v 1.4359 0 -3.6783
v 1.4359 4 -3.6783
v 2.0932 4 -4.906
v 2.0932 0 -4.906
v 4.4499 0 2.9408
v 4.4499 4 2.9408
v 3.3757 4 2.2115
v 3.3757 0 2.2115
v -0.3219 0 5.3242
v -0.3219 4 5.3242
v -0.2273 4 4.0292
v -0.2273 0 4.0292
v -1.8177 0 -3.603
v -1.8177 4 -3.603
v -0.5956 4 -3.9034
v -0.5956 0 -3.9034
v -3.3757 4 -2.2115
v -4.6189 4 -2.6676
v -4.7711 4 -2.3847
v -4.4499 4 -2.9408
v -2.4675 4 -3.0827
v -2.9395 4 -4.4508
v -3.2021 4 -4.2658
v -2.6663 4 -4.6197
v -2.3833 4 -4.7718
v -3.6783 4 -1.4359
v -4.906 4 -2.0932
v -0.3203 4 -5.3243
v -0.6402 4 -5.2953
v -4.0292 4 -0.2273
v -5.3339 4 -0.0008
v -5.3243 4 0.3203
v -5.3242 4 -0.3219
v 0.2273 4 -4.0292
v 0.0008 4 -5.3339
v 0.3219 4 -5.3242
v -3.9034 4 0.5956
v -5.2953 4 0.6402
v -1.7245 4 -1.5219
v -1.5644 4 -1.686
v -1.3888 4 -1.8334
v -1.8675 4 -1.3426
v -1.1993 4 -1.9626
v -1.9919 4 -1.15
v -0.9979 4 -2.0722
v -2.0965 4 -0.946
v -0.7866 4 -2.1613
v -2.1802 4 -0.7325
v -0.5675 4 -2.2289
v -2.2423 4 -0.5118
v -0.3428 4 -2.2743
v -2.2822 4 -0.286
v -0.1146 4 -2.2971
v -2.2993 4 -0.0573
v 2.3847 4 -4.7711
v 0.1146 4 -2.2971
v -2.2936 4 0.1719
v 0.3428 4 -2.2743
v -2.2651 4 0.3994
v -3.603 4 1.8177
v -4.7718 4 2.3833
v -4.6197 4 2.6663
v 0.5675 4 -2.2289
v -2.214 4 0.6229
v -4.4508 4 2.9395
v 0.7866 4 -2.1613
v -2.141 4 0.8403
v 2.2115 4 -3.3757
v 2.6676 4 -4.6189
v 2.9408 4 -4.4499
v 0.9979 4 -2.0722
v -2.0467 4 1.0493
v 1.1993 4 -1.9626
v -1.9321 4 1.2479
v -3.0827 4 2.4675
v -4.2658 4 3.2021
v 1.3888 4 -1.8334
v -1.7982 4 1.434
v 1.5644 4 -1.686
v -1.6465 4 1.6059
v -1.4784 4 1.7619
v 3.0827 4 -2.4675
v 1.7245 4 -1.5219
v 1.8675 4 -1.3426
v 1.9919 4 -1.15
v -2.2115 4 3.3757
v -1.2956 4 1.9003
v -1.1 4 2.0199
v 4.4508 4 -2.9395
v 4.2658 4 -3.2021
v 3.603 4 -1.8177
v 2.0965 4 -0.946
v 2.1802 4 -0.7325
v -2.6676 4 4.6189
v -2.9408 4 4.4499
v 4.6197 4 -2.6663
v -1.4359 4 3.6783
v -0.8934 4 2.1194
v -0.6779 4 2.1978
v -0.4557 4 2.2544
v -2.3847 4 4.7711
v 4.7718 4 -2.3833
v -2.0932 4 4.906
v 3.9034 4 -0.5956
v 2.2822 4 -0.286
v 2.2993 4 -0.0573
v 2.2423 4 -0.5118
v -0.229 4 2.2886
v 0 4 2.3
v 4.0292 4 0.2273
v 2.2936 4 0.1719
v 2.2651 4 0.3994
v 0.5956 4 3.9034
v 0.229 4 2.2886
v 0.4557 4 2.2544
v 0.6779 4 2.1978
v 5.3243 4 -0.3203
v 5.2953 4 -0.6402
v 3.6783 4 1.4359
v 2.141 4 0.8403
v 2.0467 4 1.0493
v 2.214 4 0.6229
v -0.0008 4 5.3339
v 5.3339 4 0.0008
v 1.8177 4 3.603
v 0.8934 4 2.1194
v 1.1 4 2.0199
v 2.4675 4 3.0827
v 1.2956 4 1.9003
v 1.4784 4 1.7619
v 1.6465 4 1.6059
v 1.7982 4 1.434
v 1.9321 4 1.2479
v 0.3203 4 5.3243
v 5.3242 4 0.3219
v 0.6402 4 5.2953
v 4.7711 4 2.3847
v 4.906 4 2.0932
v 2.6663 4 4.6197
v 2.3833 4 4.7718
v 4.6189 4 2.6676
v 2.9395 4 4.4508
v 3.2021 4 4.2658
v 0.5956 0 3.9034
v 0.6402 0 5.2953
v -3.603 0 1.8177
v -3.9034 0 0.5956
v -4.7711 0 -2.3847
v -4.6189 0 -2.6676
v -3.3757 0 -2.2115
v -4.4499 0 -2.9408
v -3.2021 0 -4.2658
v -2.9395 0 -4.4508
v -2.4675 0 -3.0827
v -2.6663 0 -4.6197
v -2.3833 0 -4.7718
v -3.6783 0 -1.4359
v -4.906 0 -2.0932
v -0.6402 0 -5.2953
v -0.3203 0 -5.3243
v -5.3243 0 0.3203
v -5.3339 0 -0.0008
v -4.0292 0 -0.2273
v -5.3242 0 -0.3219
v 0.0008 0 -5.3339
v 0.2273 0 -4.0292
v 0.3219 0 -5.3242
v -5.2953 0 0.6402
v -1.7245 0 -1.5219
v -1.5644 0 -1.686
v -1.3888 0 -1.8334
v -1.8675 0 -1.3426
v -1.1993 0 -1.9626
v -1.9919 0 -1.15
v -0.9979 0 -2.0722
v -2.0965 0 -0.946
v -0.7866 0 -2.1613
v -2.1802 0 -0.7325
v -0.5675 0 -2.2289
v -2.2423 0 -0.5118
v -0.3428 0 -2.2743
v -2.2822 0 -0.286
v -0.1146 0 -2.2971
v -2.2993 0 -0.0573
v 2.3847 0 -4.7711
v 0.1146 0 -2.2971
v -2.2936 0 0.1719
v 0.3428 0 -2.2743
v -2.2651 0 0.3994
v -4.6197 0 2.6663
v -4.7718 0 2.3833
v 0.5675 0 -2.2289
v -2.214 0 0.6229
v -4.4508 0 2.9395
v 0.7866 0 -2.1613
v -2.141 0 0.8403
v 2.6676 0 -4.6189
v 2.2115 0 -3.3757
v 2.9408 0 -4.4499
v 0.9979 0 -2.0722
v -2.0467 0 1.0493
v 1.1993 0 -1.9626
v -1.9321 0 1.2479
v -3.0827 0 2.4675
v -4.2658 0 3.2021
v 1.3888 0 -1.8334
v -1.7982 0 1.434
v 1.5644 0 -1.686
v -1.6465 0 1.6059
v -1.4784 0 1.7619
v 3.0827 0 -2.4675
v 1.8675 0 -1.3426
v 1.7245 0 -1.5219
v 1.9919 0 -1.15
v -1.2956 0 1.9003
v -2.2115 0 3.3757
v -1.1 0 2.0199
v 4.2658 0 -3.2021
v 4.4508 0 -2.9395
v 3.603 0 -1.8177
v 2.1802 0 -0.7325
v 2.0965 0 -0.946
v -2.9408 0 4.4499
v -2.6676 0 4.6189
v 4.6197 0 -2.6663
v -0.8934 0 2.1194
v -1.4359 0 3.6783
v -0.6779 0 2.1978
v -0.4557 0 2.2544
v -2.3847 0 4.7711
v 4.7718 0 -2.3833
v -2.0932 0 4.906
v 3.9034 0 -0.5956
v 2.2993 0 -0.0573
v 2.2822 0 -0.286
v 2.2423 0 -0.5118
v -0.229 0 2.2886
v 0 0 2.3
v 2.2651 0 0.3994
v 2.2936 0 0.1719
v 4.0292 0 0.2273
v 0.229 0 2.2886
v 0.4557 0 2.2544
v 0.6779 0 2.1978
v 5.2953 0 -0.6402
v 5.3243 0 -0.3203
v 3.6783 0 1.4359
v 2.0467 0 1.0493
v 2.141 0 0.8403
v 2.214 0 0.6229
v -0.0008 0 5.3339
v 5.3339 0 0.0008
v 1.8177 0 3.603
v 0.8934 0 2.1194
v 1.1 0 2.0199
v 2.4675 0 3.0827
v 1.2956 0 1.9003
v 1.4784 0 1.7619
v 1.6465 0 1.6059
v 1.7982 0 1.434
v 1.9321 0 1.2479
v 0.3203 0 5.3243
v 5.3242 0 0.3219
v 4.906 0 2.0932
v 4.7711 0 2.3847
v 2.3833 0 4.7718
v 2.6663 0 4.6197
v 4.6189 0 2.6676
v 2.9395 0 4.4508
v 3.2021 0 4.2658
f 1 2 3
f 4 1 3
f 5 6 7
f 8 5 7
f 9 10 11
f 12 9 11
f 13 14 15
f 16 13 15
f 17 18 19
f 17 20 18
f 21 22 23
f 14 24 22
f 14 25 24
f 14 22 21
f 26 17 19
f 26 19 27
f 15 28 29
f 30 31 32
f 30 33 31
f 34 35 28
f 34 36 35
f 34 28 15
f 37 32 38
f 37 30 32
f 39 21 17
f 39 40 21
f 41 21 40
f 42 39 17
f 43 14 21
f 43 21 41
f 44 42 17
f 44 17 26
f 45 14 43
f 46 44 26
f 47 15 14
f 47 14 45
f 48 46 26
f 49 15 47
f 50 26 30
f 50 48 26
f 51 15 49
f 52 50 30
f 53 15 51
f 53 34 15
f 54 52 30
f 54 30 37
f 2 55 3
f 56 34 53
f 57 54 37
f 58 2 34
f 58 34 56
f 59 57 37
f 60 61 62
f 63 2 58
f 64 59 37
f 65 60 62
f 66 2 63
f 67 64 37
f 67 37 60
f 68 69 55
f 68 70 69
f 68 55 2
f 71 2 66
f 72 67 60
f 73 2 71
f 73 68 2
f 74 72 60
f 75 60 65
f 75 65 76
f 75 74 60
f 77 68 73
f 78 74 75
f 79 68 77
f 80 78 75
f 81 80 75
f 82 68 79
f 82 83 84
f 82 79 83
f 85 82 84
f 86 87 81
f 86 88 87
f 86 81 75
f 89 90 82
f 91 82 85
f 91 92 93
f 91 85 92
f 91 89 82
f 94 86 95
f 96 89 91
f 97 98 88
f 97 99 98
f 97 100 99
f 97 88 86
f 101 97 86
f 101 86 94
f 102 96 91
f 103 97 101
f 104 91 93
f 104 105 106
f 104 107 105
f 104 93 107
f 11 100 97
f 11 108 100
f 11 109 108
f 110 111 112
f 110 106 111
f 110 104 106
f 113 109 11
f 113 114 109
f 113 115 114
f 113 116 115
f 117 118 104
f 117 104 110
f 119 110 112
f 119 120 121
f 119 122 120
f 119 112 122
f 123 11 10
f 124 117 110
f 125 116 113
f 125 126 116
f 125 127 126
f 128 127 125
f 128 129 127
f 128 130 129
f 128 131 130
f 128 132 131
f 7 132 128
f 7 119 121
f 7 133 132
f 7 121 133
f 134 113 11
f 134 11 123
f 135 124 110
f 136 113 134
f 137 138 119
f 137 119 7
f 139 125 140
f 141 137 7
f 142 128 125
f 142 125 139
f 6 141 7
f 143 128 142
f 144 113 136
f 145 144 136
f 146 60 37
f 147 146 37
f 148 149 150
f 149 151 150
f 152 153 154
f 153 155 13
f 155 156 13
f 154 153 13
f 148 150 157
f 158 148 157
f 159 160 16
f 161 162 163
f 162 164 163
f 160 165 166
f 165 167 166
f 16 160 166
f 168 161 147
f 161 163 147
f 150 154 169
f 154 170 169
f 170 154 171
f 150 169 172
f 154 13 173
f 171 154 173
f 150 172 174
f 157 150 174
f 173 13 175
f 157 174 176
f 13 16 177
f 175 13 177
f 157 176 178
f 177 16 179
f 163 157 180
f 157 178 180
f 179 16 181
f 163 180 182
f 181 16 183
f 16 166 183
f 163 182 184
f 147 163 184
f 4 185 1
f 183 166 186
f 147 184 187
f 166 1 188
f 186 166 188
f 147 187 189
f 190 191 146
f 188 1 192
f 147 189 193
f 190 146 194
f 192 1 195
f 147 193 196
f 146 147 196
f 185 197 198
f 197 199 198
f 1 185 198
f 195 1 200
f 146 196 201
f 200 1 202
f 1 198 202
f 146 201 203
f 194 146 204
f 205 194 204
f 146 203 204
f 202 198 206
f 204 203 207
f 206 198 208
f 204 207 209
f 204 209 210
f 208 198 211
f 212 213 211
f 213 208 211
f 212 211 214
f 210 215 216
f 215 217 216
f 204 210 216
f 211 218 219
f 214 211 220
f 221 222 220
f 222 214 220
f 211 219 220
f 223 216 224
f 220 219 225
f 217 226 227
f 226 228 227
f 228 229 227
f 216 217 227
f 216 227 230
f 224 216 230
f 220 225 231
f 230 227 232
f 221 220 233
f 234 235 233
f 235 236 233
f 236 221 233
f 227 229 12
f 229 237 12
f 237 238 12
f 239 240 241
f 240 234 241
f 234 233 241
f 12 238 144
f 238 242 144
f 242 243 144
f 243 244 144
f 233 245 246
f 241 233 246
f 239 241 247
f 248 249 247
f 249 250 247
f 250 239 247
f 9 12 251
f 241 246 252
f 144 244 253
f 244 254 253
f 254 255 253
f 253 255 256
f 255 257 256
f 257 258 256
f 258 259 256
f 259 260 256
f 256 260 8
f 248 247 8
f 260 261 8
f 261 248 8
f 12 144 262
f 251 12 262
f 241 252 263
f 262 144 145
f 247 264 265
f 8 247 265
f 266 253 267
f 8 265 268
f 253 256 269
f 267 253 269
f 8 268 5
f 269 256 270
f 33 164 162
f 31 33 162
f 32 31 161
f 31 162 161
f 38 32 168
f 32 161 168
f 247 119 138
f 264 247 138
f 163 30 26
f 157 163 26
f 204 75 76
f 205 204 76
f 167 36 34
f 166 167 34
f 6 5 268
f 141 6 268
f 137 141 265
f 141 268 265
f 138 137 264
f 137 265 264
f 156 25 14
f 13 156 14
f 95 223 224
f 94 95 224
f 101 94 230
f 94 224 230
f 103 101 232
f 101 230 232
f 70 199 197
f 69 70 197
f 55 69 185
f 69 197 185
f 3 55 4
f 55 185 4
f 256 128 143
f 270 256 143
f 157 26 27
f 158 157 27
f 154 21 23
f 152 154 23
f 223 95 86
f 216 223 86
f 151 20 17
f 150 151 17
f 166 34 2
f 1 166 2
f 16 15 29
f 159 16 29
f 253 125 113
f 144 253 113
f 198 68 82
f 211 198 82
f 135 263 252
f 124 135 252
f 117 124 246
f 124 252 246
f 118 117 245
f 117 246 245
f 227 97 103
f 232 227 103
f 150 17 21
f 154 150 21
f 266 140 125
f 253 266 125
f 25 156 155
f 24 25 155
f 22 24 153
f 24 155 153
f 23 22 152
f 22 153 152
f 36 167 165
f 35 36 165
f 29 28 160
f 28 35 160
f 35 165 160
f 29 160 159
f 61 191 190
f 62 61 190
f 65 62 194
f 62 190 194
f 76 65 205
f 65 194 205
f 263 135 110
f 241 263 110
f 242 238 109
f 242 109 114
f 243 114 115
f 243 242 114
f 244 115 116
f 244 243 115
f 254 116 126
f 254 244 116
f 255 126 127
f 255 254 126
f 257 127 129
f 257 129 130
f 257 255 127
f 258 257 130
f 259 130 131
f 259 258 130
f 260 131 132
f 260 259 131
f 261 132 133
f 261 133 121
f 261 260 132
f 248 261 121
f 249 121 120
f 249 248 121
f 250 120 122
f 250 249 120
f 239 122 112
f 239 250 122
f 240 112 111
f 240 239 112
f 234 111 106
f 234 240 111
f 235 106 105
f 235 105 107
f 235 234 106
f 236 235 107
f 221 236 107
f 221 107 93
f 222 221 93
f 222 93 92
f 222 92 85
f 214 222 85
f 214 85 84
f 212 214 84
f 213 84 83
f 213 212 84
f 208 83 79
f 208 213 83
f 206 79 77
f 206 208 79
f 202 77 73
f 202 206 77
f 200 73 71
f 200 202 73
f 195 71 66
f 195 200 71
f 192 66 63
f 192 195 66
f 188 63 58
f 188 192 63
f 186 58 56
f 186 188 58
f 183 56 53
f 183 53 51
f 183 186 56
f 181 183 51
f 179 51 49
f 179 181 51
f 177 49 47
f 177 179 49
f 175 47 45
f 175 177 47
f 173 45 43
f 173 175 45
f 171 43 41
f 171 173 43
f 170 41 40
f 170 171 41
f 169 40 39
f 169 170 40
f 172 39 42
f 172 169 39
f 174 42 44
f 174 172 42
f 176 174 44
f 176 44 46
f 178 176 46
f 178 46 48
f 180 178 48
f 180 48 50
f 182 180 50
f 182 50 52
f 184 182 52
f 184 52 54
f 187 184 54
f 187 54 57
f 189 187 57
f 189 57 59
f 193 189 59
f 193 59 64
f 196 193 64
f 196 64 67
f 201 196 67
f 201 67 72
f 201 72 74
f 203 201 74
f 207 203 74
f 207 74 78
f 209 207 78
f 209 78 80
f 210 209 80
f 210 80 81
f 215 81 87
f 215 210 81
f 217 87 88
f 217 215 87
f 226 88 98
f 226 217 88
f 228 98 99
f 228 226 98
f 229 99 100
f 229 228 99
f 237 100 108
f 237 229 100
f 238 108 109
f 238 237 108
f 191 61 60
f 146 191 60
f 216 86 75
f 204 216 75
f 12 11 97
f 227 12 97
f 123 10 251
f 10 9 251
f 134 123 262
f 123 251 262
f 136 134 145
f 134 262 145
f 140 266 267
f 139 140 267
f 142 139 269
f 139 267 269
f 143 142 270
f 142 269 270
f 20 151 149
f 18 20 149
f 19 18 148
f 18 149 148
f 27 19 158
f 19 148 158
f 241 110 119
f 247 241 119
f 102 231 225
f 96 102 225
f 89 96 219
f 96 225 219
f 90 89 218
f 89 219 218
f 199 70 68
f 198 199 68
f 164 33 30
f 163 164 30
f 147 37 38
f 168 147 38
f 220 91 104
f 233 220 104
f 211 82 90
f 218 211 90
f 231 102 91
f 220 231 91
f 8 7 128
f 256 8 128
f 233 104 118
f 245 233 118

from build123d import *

# Parameters (mm, degrees)
ESQUISSE1_R                  = 6
ESQUISSE1_R_2                = 2.3
BOSS_EXTRU_1_DEPTH           = 4
ENL_V_MAT_EXTRU_1_DEPTH      = 4
ENL_V_MAT_EXTRU_2_DEPTH      = 10
ENL_V_MAT_EXTRU_2_DEPTH_BACK = 10
ESQUISSE3_R                  = 6.951264174
ESQUISSE3_R_2                = 5.333890826


with BuildPart() as part:
    # Esquisse1 → Boss.-Extru.1 (new body)
    with BuildSketch(Plane(origin=(0, 0, 0), x_dir=(1, 0, 0), z_dir=(0, 1, 0))):
        Circle(ESQUISSE1_R)
        Circle(ESQUISSE1_R_2, mode=Mode.SUBTRACT)
    extrude(amount=BOSS_EXTRU_1_DEPTH)

    # Esquisse2 → Enlèv. mat.-Extru.1 (cut)
    with BuildSketch(Plane(origin=(0, 4, 0), x_dir=(1, 0, 0), z_dir=(0, 1, 0))):
        Polygon((0.37038816, 5.988556805), (0.227331291, 4.029155081), (1.435903549, 3.678279264), (2.408685878, 5.495291834), (1.792659416, 6.071810959), align=None)
        Polygon((3.315043958, 5.001048246), (2.211452214, 3.375685011), (3.082668583, 2.467531511), (4.833629077, 3.55471939), (4.588394074, 4.36201283), align=None)
        Polygon((5.371436405, 2.673512847), (3.603016302, 1.817702868), (3.90343506, 0.595610681), (5.963405269, 0.661662757), (6.154672246, 1.483416885), align=None)
        Polygon((5.988556805, -0.37038816), (4.029155081, -0.227331291), (3.678279264, -1.435903549), (5.495291834, -2.408685878), (6.071810959, -1.792659416), align=None)
        Polygon((5.001048246, -3.315043958), (3.375685011, -2.211452214), (2.467531511, -3.082668583), (3.55471939, -4.833629077), (4.36201283, -4.588394074), align=None)
        Polygon((2.673512847, -5.371436405), (1.817702868, -3.603016302), (0.595610681, -3.90343506), (0.661662757, -5.963405269), (1.483416885, -6.154672246), align=None)
        Polygon((-0.37038816, -5.988556805), (-0.227331291, -4.029155081), (-1.435903549, -3.678279264), (-2.408685878, -5.495291834), (-1.792659416, -6.071810959), align=None)
        Polygon((-3.315043958, -5.001048246), (-2.211452214, -3.375685011), (-3.082668583, -2.467531511), (-4.833629077, -3.55471939), (-4.588394074, -4.36201283), align=None)
        Polygon((-5.371436405, -2.673512847), (-3.603016302, -1.817702868), (-3.90343506, -0.595610681), (-5.963405269, -0.661662757), (-6.154672246, -1.483416885), align=None)
        Polygon((-5.988556805, 0.37038816), (-4.029155081, 0.227331291), (-3.678279264, 1.435903549), (-5.495291834, 2.408685878), (-6.071810959, 1.792659416), align=None)
        Polygon((-5.001048246, 3.315043958), (-3.375685011, 2.211452214), (-2.467531511, 3.082668583), (-3.55471939, 4.833629077), (-4.36201283, 4.588394074), align=None)
        Polygon((-2.673512847, 5.371436405), (-1.817702868, 3.603016302), (-0.595610681, 3.90343506), (-0.661662757, 5.963405269), (-1.483416885, 6.154672246), align=None)
    extrude(amount=-ENL_V_MAT_EXTRU_1_DEPTH, mode=Mode.SUBTRACT)

    # Esquisse3 → Enlèv. mat.-Extru.2 (cut, two sides: drawn at the far end of the back side and taken through both)
    with BuildSketch(Plane(origin=(0, 4, 0), x_dir=(1, 0, 0), z_dir=(0, 1, 0)).offset(-ENL_V_MAT_EXTRU_2_DEPTH_BACK)):
        Circle(ESQUISSE3_R)
        Circle(ESQUISSE3_R_2, mode=Mode.SUBTRACT)
    extrude(amount=ENL_V_MAT_EXTRU_2_DEPTH + ENL_V_MAT_EXTRU_2_DEPTH_BACK, mode=Mode.SUBTRACT)


solid = part.part
